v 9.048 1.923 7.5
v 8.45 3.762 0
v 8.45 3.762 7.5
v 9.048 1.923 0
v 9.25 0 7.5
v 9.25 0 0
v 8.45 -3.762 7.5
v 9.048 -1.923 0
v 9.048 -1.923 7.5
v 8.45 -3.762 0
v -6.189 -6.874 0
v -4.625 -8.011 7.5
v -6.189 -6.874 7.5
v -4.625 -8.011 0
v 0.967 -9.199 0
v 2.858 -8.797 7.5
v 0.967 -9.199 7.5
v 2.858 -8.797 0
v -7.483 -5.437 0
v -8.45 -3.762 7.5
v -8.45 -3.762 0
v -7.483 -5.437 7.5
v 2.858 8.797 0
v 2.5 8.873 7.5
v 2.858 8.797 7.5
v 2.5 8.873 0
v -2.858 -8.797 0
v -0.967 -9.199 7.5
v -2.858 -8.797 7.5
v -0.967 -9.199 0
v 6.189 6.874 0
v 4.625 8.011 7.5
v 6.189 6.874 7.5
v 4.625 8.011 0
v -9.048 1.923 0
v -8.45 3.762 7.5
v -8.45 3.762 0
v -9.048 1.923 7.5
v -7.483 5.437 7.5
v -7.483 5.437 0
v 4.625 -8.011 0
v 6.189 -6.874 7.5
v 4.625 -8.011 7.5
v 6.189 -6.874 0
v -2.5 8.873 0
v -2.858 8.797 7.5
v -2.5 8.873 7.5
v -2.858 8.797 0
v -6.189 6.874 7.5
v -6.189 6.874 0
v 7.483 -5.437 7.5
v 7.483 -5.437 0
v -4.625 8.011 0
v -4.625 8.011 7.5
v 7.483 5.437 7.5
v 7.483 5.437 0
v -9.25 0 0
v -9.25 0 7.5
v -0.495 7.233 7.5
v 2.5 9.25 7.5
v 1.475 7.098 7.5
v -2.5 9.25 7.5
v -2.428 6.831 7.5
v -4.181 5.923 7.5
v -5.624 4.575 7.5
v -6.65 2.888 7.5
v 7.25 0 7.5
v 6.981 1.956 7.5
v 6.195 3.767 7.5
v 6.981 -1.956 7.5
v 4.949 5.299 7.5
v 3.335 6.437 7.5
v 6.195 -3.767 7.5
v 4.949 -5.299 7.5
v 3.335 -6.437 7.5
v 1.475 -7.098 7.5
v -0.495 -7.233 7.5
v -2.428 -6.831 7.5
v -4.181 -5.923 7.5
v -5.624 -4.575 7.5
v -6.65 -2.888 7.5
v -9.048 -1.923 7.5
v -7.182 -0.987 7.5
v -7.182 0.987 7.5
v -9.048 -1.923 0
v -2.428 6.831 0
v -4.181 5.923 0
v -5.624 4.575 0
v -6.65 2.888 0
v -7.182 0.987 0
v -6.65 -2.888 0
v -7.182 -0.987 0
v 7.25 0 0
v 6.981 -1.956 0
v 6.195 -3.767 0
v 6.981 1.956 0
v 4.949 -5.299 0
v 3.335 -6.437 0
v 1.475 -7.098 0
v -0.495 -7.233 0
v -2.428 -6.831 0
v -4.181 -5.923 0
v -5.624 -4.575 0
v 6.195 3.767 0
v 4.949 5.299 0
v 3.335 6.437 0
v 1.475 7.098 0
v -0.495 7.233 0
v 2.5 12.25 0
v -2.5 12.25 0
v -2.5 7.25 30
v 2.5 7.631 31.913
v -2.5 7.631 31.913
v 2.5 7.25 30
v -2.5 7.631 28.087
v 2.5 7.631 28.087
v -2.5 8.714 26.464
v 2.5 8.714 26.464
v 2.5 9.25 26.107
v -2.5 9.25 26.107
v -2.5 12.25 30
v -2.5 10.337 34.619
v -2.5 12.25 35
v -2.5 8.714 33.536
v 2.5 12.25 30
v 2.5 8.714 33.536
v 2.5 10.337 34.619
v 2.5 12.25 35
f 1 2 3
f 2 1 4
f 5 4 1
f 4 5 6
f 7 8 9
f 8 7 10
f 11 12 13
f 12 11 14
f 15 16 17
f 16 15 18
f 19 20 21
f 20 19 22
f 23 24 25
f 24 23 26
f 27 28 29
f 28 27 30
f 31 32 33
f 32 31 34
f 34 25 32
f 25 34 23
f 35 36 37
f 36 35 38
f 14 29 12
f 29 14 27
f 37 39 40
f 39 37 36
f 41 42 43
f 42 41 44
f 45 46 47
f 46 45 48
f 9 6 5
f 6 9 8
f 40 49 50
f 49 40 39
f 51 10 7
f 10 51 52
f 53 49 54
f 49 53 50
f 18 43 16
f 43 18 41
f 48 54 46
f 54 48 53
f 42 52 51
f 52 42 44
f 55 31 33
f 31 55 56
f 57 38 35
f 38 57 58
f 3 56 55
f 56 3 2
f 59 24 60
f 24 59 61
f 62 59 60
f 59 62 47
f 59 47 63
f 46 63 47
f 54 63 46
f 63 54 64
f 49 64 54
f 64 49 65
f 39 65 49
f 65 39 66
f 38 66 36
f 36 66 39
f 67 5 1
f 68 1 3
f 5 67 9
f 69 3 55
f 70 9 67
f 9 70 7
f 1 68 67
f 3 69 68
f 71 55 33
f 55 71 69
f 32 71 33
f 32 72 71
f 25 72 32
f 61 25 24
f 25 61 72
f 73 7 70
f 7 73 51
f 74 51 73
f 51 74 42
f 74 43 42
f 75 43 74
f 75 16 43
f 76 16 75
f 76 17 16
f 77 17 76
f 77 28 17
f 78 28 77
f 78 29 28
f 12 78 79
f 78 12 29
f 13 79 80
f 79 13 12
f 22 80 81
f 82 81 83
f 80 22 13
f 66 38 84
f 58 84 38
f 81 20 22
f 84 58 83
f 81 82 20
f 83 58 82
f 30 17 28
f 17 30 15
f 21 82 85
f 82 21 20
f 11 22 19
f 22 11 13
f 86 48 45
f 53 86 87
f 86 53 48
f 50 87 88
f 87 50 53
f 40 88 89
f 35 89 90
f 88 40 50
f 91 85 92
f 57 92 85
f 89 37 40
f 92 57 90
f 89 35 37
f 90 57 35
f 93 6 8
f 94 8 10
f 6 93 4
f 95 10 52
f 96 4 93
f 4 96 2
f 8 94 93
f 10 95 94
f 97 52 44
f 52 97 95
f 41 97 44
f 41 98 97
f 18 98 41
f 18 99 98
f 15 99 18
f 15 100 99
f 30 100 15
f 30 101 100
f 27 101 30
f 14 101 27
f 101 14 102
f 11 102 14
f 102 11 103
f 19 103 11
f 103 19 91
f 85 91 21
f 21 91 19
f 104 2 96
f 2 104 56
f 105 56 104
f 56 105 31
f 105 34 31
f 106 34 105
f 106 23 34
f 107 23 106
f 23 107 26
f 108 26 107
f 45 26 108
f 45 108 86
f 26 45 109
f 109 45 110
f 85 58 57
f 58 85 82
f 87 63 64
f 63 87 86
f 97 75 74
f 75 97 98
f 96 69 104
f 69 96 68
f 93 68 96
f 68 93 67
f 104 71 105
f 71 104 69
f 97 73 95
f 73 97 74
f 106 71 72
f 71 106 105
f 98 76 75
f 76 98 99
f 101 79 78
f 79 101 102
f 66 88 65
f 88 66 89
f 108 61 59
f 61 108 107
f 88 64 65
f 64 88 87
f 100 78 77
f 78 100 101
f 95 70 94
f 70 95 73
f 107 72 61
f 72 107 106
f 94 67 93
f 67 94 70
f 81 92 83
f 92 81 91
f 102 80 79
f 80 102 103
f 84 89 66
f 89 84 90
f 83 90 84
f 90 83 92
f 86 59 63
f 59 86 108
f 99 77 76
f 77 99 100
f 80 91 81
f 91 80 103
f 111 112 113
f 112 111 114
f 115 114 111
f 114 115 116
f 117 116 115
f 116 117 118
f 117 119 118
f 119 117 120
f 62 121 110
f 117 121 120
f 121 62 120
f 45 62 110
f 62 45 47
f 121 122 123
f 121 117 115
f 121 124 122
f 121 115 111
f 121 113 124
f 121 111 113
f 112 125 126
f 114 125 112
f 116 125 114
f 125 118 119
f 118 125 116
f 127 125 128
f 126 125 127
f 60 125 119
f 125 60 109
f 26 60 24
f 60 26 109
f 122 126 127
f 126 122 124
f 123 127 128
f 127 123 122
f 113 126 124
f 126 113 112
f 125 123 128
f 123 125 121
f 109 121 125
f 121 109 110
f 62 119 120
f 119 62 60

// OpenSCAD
// Pen-style Clip for Cylindrical Things
// (c) 2013, Christopher "ScribbleJ" Jansen

// Diameter of Pen
pen_d = 14.5;
// Thickness of Pen-Holding Part
pen_thick = 2;
// Length of Pen-holding Part
pen_l = 7.5;
// Clip Length
clip_l = 30;
// Clip Thickness
clip_thick = 3;
// Clip Width
clip_w     = 5;
// Clip Bump Thickness
clip_bump  = 5;

/* [Hidden] */

huge = 500;

union()
{
difference()
{
  cylinder(r=pen_d/2 + pen_thick, h=pen_l);
  translate([0,0,-0.5]) cylinder(r=pen_d/2, h=pen_l+1);
}
translate([-clip_w/2,0,0])
{
  translate([0,pen_d/2 + (clip_bump-clip_thick),0]) cube([clip_w,clip_thick,clip_l]);
  translate([0,pen_d/2,0]) cube([clip_w, clip_bump, pen_l]);
  //#translate([0,pen_d/2 + clip_thick,clip_l]) 
  translate([0,pen_d/2 + clip_bump,clip_l]) difference() 
  {
    rotate([0,90,0]) cylinder(r=clip_bump, h=clip_w);
    translate([-huge/2,0,-huge/2]) cube([huge,huge,huge]);
  }
}
}
